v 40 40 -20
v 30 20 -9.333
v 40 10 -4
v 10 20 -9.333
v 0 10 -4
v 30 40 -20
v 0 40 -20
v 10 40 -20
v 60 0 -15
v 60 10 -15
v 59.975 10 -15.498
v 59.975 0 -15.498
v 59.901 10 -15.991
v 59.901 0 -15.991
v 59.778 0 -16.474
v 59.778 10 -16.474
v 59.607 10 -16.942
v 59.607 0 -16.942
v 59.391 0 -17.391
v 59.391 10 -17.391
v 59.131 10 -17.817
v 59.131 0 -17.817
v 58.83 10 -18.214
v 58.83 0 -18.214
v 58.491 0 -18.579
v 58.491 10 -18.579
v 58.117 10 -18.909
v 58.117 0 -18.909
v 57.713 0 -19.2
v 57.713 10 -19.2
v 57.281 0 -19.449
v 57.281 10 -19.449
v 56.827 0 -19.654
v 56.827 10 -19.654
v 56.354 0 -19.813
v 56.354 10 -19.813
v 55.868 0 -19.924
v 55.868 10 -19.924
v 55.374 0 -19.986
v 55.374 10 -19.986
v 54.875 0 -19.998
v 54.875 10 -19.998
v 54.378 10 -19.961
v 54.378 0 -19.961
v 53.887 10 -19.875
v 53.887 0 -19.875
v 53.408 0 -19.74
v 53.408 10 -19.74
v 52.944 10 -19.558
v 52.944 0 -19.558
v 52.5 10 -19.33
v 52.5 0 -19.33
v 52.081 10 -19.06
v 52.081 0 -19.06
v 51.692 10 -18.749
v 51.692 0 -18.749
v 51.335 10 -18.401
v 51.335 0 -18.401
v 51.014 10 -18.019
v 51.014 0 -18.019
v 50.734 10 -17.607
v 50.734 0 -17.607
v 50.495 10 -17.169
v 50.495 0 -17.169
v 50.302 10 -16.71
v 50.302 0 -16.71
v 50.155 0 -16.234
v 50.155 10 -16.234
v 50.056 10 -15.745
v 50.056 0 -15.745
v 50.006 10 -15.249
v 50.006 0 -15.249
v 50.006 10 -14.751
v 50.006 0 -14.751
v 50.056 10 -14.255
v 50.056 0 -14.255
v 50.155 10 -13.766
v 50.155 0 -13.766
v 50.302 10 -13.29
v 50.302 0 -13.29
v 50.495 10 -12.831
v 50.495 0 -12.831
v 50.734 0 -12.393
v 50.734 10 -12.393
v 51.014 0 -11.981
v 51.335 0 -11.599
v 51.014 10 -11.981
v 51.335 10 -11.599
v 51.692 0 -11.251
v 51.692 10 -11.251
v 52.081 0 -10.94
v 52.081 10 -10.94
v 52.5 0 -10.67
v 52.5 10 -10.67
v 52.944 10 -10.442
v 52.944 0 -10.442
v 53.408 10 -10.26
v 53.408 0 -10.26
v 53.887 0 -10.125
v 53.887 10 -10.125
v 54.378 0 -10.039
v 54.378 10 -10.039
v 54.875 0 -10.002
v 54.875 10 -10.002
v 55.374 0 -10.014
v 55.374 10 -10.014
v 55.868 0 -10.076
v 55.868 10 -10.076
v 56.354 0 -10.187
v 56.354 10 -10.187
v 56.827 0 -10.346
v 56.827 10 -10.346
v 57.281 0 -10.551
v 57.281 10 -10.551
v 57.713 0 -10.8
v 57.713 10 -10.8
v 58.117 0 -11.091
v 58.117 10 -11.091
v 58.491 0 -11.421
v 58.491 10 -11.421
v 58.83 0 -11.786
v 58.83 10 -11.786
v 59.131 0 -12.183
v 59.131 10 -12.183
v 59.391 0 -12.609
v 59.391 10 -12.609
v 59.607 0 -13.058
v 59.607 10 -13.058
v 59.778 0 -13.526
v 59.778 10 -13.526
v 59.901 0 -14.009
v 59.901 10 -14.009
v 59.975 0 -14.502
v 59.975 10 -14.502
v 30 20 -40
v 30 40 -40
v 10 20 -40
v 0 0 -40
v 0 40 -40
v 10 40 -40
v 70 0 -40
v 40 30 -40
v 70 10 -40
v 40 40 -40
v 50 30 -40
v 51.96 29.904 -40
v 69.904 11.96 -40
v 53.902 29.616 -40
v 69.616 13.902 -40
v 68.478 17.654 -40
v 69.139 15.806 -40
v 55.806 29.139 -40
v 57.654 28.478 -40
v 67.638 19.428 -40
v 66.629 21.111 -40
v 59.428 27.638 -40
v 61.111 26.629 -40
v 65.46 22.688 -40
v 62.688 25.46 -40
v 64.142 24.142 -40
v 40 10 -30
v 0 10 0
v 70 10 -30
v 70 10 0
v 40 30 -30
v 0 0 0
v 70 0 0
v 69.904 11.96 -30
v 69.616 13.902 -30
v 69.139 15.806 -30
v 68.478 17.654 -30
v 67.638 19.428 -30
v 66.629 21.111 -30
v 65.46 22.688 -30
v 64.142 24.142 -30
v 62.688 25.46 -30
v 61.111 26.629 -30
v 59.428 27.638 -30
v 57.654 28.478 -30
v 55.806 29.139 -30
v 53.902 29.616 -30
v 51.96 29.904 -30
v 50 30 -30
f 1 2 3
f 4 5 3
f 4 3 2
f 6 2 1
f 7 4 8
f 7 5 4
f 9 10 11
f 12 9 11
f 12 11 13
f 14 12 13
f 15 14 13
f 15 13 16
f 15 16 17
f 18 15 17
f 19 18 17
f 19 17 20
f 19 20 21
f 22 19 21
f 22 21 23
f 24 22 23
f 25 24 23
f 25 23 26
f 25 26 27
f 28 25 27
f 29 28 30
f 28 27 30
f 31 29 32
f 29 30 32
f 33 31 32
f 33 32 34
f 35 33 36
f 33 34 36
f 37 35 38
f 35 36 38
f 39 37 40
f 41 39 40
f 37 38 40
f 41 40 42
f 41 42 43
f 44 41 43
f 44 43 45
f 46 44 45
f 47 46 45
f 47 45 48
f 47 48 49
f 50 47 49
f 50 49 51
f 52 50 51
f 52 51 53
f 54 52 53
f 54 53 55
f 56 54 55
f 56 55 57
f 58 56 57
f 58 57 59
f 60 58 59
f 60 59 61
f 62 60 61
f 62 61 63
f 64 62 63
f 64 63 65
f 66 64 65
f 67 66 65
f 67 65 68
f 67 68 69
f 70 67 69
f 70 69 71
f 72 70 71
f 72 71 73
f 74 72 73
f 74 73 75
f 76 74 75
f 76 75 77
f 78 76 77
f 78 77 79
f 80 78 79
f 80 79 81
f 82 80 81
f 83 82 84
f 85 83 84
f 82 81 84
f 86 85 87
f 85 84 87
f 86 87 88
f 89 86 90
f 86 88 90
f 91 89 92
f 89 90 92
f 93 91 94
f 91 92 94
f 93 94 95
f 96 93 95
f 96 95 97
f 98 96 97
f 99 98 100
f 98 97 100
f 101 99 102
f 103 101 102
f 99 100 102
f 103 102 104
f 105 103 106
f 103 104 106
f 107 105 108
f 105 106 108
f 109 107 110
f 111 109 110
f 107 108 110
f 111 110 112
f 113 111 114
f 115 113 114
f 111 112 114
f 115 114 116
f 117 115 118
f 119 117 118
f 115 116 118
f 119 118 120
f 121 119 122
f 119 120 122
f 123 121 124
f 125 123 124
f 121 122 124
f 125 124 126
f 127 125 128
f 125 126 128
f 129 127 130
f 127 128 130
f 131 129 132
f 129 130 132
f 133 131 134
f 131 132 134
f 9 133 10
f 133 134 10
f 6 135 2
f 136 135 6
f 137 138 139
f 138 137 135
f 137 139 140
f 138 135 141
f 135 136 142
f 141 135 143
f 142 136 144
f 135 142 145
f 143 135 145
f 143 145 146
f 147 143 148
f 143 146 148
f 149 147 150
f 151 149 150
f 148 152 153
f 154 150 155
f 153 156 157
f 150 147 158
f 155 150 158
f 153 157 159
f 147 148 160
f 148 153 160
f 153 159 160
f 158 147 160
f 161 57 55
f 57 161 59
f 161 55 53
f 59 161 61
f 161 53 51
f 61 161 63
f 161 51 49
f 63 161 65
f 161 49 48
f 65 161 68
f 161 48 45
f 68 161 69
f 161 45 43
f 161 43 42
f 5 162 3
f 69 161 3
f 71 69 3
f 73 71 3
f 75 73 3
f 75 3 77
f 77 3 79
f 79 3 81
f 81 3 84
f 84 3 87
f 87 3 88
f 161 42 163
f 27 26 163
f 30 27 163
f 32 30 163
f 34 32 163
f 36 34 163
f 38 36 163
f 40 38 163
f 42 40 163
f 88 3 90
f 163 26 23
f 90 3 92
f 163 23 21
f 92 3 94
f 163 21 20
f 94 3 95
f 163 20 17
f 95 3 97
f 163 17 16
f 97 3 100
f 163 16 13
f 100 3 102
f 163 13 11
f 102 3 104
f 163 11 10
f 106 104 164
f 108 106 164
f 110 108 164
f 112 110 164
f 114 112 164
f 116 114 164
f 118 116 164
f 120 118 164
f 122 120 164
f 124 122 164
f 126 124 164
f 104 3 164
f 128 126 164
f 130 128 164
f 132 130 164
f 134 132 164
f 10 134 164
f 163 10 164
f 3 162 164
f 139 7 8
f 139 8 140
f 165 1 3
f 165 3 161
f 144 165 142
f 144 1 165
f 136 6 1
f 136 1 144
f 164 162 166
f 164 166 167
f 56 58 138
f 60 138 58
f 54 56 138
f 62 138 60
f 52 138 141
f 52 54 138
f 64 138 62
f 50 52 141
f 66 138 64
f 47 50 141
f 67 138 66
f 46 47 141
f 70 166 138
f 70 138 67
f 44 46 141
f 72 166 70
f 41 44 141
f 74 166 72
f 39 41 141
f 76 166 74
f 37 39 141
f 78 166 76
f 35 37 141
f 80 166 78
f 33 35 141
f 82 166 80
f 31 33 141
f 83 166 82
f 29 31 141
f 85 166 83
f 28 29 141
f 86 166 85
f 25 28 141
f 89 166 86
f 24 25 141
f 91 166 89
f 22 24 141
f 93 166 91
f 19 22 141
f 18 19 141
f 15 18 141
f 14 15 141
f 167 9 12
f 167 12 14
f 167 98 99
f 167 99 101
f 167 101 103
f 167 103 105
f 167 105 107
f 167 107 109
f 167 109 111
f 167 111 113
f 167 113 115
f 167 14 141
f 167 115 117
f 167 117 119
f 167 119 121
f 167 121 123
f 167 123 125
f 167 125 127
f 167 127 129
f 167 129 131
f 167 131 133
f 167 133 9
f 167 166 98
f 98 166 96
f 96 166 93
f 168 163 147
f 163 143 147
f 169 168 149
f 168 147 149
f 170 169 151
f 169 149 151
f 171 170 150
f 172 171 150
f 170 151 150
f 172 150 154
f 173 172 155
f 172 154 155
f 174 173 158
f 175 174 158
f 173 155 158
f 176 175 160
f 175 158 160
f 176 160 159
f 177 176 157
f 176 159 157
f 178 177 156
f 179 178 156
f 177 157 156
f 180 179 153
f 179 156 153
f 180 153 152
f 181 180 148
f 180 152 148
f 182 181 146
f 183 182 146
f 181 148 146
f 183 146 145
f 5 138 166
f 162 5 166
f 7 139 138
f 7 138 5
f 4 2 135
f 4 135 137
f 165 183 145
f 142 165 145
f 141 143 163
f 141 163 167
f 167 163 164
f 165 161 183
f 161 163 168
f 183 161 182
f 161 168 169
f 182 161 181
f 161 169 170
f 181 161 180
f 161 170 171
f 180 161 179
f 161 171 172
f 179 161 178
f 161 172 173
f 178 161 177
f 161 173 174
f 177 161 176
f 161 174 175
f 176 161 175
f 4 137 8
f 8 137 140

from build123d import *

# Parameters (mm, degrees)
BOSS_EXTRUDE1_DEPTH            = 40
SKETCH2_W                      = 40
SKETCH2_H                      = 30
BOSS_EXTRUDE2_DEPTH            = 20
BOSS_EXTRUDE3_DEPTH            = 30
CUT_EXTRUDE1_DEPTH             = 30
SKETCH5_W                      = 70
SKETCH5_H                      = 40
BOSS_EXTRUDE4_DEPTH            = 10
SKETCH6_W                      = 20
SKETCH6_H                      = 20
CUT_EXTRUDE2_DEPTH             = 41
F_10_0_10_DIAMETER_HOLE1_D     = 10
F_10_0_10_DIAMETER_HOLE1_DEPTH = 40
FILLET1_R                      = 20


with BuildPart() as part:
    # Sketch1 → Boss-Extrude1 (new body)
    with BuildSketch(Plane(origin=(0, 0, 0), x_dir=(0, -1, 0), z_dir=(-1, 0, 0))):
        Polygon((-10, -4), (-40, -20), (-10, -20), align=None)
    extrude(amount=-BOSS_EXTRUDE1_DEPTH)

    # Sketch2 → Boss-Extrude2 (add)
    with BuildSketch(Plane(origin=(0, 0, -20), x_dir=(-1, 0, 0), z_dir=(0, 0, -1))):
        with Locations((-20, 25)):
            Rectangle(SKETCH2_W, SKETCH2_H)
    extrude(amount=BOSS_EXTRUDE2_DEPTH)

    # Sketch3 → Boss-Extrude3 (add)
    with BuildSketch(Plane(origin=(40, 0, 0), x_dir=(0, 0, -1), z_dir=(1, 0, 0))):
        Polygon((40, 10), (0, 10), (20, 40), (40, 40), align=None)
    extrude(amount=BOSS_EXTRUDE3_DEPTH)

    # Sketch4 → Cut-Extrude1 (cut)
    with BuildSketch(Plane(origin=(70, 0, 0), x_dir=(0, 0, -1), z_dir=(1, 0, 0))):
        Polygon((20, 40), (0, 10), (30, 10), (30, 30), (40, 30), (40, 40), align=None)
    extrude(amount=-CUT_EXTRUDE1_DEPTH, mode=Mode.SUBTRACT)

    # Sketch5 → Boss-Extrude4 (add)
    with BuildSketch(Plane.XZ.offset(-10)):
        with Locations((35, -20)):
            Rectangle(SKETCH5_W, SKETCH5_H)
    extrude(amount=BOSS_EXTRUDE4_DEPTH)

    # Sketch6 → Cut-Extrude2 (cut, through all)
    with BuildSketch(Plane(origin=(0, 0, -40), x_dir=(-1, 0, 0), z_dir=(0, 0, -1))):
        with Locations((-20, 30)):
            Rectangle(SKETCH6_W, SKETCH6_H)
    extrude(amount=-CUT_EXTRUDE2_DEPTH, mode=Mode.SUBTRACT)

    # Ø10.0 (10) Diameter Hole1
    with Locations(Plane(origin=(0, 0, 0), x_dir=(-1, 0, 0), z_dir=(0, -1, 0))):
        with Locations((-55, 15)):
            Hole(F_10_0_10_DIAMETER_HOLE1_D / 2, depth=F_10_0_10_DIAMETER_HOLE1_DEPTH)

    # Fillet1
    fillet1_edges = [part.edges().sort_by_distance(p)[0] for p in [
        (70, 30, -35),
    ]]
    fillet(fillet1_edges, radius=FILLET1_R)


solid = part.part
